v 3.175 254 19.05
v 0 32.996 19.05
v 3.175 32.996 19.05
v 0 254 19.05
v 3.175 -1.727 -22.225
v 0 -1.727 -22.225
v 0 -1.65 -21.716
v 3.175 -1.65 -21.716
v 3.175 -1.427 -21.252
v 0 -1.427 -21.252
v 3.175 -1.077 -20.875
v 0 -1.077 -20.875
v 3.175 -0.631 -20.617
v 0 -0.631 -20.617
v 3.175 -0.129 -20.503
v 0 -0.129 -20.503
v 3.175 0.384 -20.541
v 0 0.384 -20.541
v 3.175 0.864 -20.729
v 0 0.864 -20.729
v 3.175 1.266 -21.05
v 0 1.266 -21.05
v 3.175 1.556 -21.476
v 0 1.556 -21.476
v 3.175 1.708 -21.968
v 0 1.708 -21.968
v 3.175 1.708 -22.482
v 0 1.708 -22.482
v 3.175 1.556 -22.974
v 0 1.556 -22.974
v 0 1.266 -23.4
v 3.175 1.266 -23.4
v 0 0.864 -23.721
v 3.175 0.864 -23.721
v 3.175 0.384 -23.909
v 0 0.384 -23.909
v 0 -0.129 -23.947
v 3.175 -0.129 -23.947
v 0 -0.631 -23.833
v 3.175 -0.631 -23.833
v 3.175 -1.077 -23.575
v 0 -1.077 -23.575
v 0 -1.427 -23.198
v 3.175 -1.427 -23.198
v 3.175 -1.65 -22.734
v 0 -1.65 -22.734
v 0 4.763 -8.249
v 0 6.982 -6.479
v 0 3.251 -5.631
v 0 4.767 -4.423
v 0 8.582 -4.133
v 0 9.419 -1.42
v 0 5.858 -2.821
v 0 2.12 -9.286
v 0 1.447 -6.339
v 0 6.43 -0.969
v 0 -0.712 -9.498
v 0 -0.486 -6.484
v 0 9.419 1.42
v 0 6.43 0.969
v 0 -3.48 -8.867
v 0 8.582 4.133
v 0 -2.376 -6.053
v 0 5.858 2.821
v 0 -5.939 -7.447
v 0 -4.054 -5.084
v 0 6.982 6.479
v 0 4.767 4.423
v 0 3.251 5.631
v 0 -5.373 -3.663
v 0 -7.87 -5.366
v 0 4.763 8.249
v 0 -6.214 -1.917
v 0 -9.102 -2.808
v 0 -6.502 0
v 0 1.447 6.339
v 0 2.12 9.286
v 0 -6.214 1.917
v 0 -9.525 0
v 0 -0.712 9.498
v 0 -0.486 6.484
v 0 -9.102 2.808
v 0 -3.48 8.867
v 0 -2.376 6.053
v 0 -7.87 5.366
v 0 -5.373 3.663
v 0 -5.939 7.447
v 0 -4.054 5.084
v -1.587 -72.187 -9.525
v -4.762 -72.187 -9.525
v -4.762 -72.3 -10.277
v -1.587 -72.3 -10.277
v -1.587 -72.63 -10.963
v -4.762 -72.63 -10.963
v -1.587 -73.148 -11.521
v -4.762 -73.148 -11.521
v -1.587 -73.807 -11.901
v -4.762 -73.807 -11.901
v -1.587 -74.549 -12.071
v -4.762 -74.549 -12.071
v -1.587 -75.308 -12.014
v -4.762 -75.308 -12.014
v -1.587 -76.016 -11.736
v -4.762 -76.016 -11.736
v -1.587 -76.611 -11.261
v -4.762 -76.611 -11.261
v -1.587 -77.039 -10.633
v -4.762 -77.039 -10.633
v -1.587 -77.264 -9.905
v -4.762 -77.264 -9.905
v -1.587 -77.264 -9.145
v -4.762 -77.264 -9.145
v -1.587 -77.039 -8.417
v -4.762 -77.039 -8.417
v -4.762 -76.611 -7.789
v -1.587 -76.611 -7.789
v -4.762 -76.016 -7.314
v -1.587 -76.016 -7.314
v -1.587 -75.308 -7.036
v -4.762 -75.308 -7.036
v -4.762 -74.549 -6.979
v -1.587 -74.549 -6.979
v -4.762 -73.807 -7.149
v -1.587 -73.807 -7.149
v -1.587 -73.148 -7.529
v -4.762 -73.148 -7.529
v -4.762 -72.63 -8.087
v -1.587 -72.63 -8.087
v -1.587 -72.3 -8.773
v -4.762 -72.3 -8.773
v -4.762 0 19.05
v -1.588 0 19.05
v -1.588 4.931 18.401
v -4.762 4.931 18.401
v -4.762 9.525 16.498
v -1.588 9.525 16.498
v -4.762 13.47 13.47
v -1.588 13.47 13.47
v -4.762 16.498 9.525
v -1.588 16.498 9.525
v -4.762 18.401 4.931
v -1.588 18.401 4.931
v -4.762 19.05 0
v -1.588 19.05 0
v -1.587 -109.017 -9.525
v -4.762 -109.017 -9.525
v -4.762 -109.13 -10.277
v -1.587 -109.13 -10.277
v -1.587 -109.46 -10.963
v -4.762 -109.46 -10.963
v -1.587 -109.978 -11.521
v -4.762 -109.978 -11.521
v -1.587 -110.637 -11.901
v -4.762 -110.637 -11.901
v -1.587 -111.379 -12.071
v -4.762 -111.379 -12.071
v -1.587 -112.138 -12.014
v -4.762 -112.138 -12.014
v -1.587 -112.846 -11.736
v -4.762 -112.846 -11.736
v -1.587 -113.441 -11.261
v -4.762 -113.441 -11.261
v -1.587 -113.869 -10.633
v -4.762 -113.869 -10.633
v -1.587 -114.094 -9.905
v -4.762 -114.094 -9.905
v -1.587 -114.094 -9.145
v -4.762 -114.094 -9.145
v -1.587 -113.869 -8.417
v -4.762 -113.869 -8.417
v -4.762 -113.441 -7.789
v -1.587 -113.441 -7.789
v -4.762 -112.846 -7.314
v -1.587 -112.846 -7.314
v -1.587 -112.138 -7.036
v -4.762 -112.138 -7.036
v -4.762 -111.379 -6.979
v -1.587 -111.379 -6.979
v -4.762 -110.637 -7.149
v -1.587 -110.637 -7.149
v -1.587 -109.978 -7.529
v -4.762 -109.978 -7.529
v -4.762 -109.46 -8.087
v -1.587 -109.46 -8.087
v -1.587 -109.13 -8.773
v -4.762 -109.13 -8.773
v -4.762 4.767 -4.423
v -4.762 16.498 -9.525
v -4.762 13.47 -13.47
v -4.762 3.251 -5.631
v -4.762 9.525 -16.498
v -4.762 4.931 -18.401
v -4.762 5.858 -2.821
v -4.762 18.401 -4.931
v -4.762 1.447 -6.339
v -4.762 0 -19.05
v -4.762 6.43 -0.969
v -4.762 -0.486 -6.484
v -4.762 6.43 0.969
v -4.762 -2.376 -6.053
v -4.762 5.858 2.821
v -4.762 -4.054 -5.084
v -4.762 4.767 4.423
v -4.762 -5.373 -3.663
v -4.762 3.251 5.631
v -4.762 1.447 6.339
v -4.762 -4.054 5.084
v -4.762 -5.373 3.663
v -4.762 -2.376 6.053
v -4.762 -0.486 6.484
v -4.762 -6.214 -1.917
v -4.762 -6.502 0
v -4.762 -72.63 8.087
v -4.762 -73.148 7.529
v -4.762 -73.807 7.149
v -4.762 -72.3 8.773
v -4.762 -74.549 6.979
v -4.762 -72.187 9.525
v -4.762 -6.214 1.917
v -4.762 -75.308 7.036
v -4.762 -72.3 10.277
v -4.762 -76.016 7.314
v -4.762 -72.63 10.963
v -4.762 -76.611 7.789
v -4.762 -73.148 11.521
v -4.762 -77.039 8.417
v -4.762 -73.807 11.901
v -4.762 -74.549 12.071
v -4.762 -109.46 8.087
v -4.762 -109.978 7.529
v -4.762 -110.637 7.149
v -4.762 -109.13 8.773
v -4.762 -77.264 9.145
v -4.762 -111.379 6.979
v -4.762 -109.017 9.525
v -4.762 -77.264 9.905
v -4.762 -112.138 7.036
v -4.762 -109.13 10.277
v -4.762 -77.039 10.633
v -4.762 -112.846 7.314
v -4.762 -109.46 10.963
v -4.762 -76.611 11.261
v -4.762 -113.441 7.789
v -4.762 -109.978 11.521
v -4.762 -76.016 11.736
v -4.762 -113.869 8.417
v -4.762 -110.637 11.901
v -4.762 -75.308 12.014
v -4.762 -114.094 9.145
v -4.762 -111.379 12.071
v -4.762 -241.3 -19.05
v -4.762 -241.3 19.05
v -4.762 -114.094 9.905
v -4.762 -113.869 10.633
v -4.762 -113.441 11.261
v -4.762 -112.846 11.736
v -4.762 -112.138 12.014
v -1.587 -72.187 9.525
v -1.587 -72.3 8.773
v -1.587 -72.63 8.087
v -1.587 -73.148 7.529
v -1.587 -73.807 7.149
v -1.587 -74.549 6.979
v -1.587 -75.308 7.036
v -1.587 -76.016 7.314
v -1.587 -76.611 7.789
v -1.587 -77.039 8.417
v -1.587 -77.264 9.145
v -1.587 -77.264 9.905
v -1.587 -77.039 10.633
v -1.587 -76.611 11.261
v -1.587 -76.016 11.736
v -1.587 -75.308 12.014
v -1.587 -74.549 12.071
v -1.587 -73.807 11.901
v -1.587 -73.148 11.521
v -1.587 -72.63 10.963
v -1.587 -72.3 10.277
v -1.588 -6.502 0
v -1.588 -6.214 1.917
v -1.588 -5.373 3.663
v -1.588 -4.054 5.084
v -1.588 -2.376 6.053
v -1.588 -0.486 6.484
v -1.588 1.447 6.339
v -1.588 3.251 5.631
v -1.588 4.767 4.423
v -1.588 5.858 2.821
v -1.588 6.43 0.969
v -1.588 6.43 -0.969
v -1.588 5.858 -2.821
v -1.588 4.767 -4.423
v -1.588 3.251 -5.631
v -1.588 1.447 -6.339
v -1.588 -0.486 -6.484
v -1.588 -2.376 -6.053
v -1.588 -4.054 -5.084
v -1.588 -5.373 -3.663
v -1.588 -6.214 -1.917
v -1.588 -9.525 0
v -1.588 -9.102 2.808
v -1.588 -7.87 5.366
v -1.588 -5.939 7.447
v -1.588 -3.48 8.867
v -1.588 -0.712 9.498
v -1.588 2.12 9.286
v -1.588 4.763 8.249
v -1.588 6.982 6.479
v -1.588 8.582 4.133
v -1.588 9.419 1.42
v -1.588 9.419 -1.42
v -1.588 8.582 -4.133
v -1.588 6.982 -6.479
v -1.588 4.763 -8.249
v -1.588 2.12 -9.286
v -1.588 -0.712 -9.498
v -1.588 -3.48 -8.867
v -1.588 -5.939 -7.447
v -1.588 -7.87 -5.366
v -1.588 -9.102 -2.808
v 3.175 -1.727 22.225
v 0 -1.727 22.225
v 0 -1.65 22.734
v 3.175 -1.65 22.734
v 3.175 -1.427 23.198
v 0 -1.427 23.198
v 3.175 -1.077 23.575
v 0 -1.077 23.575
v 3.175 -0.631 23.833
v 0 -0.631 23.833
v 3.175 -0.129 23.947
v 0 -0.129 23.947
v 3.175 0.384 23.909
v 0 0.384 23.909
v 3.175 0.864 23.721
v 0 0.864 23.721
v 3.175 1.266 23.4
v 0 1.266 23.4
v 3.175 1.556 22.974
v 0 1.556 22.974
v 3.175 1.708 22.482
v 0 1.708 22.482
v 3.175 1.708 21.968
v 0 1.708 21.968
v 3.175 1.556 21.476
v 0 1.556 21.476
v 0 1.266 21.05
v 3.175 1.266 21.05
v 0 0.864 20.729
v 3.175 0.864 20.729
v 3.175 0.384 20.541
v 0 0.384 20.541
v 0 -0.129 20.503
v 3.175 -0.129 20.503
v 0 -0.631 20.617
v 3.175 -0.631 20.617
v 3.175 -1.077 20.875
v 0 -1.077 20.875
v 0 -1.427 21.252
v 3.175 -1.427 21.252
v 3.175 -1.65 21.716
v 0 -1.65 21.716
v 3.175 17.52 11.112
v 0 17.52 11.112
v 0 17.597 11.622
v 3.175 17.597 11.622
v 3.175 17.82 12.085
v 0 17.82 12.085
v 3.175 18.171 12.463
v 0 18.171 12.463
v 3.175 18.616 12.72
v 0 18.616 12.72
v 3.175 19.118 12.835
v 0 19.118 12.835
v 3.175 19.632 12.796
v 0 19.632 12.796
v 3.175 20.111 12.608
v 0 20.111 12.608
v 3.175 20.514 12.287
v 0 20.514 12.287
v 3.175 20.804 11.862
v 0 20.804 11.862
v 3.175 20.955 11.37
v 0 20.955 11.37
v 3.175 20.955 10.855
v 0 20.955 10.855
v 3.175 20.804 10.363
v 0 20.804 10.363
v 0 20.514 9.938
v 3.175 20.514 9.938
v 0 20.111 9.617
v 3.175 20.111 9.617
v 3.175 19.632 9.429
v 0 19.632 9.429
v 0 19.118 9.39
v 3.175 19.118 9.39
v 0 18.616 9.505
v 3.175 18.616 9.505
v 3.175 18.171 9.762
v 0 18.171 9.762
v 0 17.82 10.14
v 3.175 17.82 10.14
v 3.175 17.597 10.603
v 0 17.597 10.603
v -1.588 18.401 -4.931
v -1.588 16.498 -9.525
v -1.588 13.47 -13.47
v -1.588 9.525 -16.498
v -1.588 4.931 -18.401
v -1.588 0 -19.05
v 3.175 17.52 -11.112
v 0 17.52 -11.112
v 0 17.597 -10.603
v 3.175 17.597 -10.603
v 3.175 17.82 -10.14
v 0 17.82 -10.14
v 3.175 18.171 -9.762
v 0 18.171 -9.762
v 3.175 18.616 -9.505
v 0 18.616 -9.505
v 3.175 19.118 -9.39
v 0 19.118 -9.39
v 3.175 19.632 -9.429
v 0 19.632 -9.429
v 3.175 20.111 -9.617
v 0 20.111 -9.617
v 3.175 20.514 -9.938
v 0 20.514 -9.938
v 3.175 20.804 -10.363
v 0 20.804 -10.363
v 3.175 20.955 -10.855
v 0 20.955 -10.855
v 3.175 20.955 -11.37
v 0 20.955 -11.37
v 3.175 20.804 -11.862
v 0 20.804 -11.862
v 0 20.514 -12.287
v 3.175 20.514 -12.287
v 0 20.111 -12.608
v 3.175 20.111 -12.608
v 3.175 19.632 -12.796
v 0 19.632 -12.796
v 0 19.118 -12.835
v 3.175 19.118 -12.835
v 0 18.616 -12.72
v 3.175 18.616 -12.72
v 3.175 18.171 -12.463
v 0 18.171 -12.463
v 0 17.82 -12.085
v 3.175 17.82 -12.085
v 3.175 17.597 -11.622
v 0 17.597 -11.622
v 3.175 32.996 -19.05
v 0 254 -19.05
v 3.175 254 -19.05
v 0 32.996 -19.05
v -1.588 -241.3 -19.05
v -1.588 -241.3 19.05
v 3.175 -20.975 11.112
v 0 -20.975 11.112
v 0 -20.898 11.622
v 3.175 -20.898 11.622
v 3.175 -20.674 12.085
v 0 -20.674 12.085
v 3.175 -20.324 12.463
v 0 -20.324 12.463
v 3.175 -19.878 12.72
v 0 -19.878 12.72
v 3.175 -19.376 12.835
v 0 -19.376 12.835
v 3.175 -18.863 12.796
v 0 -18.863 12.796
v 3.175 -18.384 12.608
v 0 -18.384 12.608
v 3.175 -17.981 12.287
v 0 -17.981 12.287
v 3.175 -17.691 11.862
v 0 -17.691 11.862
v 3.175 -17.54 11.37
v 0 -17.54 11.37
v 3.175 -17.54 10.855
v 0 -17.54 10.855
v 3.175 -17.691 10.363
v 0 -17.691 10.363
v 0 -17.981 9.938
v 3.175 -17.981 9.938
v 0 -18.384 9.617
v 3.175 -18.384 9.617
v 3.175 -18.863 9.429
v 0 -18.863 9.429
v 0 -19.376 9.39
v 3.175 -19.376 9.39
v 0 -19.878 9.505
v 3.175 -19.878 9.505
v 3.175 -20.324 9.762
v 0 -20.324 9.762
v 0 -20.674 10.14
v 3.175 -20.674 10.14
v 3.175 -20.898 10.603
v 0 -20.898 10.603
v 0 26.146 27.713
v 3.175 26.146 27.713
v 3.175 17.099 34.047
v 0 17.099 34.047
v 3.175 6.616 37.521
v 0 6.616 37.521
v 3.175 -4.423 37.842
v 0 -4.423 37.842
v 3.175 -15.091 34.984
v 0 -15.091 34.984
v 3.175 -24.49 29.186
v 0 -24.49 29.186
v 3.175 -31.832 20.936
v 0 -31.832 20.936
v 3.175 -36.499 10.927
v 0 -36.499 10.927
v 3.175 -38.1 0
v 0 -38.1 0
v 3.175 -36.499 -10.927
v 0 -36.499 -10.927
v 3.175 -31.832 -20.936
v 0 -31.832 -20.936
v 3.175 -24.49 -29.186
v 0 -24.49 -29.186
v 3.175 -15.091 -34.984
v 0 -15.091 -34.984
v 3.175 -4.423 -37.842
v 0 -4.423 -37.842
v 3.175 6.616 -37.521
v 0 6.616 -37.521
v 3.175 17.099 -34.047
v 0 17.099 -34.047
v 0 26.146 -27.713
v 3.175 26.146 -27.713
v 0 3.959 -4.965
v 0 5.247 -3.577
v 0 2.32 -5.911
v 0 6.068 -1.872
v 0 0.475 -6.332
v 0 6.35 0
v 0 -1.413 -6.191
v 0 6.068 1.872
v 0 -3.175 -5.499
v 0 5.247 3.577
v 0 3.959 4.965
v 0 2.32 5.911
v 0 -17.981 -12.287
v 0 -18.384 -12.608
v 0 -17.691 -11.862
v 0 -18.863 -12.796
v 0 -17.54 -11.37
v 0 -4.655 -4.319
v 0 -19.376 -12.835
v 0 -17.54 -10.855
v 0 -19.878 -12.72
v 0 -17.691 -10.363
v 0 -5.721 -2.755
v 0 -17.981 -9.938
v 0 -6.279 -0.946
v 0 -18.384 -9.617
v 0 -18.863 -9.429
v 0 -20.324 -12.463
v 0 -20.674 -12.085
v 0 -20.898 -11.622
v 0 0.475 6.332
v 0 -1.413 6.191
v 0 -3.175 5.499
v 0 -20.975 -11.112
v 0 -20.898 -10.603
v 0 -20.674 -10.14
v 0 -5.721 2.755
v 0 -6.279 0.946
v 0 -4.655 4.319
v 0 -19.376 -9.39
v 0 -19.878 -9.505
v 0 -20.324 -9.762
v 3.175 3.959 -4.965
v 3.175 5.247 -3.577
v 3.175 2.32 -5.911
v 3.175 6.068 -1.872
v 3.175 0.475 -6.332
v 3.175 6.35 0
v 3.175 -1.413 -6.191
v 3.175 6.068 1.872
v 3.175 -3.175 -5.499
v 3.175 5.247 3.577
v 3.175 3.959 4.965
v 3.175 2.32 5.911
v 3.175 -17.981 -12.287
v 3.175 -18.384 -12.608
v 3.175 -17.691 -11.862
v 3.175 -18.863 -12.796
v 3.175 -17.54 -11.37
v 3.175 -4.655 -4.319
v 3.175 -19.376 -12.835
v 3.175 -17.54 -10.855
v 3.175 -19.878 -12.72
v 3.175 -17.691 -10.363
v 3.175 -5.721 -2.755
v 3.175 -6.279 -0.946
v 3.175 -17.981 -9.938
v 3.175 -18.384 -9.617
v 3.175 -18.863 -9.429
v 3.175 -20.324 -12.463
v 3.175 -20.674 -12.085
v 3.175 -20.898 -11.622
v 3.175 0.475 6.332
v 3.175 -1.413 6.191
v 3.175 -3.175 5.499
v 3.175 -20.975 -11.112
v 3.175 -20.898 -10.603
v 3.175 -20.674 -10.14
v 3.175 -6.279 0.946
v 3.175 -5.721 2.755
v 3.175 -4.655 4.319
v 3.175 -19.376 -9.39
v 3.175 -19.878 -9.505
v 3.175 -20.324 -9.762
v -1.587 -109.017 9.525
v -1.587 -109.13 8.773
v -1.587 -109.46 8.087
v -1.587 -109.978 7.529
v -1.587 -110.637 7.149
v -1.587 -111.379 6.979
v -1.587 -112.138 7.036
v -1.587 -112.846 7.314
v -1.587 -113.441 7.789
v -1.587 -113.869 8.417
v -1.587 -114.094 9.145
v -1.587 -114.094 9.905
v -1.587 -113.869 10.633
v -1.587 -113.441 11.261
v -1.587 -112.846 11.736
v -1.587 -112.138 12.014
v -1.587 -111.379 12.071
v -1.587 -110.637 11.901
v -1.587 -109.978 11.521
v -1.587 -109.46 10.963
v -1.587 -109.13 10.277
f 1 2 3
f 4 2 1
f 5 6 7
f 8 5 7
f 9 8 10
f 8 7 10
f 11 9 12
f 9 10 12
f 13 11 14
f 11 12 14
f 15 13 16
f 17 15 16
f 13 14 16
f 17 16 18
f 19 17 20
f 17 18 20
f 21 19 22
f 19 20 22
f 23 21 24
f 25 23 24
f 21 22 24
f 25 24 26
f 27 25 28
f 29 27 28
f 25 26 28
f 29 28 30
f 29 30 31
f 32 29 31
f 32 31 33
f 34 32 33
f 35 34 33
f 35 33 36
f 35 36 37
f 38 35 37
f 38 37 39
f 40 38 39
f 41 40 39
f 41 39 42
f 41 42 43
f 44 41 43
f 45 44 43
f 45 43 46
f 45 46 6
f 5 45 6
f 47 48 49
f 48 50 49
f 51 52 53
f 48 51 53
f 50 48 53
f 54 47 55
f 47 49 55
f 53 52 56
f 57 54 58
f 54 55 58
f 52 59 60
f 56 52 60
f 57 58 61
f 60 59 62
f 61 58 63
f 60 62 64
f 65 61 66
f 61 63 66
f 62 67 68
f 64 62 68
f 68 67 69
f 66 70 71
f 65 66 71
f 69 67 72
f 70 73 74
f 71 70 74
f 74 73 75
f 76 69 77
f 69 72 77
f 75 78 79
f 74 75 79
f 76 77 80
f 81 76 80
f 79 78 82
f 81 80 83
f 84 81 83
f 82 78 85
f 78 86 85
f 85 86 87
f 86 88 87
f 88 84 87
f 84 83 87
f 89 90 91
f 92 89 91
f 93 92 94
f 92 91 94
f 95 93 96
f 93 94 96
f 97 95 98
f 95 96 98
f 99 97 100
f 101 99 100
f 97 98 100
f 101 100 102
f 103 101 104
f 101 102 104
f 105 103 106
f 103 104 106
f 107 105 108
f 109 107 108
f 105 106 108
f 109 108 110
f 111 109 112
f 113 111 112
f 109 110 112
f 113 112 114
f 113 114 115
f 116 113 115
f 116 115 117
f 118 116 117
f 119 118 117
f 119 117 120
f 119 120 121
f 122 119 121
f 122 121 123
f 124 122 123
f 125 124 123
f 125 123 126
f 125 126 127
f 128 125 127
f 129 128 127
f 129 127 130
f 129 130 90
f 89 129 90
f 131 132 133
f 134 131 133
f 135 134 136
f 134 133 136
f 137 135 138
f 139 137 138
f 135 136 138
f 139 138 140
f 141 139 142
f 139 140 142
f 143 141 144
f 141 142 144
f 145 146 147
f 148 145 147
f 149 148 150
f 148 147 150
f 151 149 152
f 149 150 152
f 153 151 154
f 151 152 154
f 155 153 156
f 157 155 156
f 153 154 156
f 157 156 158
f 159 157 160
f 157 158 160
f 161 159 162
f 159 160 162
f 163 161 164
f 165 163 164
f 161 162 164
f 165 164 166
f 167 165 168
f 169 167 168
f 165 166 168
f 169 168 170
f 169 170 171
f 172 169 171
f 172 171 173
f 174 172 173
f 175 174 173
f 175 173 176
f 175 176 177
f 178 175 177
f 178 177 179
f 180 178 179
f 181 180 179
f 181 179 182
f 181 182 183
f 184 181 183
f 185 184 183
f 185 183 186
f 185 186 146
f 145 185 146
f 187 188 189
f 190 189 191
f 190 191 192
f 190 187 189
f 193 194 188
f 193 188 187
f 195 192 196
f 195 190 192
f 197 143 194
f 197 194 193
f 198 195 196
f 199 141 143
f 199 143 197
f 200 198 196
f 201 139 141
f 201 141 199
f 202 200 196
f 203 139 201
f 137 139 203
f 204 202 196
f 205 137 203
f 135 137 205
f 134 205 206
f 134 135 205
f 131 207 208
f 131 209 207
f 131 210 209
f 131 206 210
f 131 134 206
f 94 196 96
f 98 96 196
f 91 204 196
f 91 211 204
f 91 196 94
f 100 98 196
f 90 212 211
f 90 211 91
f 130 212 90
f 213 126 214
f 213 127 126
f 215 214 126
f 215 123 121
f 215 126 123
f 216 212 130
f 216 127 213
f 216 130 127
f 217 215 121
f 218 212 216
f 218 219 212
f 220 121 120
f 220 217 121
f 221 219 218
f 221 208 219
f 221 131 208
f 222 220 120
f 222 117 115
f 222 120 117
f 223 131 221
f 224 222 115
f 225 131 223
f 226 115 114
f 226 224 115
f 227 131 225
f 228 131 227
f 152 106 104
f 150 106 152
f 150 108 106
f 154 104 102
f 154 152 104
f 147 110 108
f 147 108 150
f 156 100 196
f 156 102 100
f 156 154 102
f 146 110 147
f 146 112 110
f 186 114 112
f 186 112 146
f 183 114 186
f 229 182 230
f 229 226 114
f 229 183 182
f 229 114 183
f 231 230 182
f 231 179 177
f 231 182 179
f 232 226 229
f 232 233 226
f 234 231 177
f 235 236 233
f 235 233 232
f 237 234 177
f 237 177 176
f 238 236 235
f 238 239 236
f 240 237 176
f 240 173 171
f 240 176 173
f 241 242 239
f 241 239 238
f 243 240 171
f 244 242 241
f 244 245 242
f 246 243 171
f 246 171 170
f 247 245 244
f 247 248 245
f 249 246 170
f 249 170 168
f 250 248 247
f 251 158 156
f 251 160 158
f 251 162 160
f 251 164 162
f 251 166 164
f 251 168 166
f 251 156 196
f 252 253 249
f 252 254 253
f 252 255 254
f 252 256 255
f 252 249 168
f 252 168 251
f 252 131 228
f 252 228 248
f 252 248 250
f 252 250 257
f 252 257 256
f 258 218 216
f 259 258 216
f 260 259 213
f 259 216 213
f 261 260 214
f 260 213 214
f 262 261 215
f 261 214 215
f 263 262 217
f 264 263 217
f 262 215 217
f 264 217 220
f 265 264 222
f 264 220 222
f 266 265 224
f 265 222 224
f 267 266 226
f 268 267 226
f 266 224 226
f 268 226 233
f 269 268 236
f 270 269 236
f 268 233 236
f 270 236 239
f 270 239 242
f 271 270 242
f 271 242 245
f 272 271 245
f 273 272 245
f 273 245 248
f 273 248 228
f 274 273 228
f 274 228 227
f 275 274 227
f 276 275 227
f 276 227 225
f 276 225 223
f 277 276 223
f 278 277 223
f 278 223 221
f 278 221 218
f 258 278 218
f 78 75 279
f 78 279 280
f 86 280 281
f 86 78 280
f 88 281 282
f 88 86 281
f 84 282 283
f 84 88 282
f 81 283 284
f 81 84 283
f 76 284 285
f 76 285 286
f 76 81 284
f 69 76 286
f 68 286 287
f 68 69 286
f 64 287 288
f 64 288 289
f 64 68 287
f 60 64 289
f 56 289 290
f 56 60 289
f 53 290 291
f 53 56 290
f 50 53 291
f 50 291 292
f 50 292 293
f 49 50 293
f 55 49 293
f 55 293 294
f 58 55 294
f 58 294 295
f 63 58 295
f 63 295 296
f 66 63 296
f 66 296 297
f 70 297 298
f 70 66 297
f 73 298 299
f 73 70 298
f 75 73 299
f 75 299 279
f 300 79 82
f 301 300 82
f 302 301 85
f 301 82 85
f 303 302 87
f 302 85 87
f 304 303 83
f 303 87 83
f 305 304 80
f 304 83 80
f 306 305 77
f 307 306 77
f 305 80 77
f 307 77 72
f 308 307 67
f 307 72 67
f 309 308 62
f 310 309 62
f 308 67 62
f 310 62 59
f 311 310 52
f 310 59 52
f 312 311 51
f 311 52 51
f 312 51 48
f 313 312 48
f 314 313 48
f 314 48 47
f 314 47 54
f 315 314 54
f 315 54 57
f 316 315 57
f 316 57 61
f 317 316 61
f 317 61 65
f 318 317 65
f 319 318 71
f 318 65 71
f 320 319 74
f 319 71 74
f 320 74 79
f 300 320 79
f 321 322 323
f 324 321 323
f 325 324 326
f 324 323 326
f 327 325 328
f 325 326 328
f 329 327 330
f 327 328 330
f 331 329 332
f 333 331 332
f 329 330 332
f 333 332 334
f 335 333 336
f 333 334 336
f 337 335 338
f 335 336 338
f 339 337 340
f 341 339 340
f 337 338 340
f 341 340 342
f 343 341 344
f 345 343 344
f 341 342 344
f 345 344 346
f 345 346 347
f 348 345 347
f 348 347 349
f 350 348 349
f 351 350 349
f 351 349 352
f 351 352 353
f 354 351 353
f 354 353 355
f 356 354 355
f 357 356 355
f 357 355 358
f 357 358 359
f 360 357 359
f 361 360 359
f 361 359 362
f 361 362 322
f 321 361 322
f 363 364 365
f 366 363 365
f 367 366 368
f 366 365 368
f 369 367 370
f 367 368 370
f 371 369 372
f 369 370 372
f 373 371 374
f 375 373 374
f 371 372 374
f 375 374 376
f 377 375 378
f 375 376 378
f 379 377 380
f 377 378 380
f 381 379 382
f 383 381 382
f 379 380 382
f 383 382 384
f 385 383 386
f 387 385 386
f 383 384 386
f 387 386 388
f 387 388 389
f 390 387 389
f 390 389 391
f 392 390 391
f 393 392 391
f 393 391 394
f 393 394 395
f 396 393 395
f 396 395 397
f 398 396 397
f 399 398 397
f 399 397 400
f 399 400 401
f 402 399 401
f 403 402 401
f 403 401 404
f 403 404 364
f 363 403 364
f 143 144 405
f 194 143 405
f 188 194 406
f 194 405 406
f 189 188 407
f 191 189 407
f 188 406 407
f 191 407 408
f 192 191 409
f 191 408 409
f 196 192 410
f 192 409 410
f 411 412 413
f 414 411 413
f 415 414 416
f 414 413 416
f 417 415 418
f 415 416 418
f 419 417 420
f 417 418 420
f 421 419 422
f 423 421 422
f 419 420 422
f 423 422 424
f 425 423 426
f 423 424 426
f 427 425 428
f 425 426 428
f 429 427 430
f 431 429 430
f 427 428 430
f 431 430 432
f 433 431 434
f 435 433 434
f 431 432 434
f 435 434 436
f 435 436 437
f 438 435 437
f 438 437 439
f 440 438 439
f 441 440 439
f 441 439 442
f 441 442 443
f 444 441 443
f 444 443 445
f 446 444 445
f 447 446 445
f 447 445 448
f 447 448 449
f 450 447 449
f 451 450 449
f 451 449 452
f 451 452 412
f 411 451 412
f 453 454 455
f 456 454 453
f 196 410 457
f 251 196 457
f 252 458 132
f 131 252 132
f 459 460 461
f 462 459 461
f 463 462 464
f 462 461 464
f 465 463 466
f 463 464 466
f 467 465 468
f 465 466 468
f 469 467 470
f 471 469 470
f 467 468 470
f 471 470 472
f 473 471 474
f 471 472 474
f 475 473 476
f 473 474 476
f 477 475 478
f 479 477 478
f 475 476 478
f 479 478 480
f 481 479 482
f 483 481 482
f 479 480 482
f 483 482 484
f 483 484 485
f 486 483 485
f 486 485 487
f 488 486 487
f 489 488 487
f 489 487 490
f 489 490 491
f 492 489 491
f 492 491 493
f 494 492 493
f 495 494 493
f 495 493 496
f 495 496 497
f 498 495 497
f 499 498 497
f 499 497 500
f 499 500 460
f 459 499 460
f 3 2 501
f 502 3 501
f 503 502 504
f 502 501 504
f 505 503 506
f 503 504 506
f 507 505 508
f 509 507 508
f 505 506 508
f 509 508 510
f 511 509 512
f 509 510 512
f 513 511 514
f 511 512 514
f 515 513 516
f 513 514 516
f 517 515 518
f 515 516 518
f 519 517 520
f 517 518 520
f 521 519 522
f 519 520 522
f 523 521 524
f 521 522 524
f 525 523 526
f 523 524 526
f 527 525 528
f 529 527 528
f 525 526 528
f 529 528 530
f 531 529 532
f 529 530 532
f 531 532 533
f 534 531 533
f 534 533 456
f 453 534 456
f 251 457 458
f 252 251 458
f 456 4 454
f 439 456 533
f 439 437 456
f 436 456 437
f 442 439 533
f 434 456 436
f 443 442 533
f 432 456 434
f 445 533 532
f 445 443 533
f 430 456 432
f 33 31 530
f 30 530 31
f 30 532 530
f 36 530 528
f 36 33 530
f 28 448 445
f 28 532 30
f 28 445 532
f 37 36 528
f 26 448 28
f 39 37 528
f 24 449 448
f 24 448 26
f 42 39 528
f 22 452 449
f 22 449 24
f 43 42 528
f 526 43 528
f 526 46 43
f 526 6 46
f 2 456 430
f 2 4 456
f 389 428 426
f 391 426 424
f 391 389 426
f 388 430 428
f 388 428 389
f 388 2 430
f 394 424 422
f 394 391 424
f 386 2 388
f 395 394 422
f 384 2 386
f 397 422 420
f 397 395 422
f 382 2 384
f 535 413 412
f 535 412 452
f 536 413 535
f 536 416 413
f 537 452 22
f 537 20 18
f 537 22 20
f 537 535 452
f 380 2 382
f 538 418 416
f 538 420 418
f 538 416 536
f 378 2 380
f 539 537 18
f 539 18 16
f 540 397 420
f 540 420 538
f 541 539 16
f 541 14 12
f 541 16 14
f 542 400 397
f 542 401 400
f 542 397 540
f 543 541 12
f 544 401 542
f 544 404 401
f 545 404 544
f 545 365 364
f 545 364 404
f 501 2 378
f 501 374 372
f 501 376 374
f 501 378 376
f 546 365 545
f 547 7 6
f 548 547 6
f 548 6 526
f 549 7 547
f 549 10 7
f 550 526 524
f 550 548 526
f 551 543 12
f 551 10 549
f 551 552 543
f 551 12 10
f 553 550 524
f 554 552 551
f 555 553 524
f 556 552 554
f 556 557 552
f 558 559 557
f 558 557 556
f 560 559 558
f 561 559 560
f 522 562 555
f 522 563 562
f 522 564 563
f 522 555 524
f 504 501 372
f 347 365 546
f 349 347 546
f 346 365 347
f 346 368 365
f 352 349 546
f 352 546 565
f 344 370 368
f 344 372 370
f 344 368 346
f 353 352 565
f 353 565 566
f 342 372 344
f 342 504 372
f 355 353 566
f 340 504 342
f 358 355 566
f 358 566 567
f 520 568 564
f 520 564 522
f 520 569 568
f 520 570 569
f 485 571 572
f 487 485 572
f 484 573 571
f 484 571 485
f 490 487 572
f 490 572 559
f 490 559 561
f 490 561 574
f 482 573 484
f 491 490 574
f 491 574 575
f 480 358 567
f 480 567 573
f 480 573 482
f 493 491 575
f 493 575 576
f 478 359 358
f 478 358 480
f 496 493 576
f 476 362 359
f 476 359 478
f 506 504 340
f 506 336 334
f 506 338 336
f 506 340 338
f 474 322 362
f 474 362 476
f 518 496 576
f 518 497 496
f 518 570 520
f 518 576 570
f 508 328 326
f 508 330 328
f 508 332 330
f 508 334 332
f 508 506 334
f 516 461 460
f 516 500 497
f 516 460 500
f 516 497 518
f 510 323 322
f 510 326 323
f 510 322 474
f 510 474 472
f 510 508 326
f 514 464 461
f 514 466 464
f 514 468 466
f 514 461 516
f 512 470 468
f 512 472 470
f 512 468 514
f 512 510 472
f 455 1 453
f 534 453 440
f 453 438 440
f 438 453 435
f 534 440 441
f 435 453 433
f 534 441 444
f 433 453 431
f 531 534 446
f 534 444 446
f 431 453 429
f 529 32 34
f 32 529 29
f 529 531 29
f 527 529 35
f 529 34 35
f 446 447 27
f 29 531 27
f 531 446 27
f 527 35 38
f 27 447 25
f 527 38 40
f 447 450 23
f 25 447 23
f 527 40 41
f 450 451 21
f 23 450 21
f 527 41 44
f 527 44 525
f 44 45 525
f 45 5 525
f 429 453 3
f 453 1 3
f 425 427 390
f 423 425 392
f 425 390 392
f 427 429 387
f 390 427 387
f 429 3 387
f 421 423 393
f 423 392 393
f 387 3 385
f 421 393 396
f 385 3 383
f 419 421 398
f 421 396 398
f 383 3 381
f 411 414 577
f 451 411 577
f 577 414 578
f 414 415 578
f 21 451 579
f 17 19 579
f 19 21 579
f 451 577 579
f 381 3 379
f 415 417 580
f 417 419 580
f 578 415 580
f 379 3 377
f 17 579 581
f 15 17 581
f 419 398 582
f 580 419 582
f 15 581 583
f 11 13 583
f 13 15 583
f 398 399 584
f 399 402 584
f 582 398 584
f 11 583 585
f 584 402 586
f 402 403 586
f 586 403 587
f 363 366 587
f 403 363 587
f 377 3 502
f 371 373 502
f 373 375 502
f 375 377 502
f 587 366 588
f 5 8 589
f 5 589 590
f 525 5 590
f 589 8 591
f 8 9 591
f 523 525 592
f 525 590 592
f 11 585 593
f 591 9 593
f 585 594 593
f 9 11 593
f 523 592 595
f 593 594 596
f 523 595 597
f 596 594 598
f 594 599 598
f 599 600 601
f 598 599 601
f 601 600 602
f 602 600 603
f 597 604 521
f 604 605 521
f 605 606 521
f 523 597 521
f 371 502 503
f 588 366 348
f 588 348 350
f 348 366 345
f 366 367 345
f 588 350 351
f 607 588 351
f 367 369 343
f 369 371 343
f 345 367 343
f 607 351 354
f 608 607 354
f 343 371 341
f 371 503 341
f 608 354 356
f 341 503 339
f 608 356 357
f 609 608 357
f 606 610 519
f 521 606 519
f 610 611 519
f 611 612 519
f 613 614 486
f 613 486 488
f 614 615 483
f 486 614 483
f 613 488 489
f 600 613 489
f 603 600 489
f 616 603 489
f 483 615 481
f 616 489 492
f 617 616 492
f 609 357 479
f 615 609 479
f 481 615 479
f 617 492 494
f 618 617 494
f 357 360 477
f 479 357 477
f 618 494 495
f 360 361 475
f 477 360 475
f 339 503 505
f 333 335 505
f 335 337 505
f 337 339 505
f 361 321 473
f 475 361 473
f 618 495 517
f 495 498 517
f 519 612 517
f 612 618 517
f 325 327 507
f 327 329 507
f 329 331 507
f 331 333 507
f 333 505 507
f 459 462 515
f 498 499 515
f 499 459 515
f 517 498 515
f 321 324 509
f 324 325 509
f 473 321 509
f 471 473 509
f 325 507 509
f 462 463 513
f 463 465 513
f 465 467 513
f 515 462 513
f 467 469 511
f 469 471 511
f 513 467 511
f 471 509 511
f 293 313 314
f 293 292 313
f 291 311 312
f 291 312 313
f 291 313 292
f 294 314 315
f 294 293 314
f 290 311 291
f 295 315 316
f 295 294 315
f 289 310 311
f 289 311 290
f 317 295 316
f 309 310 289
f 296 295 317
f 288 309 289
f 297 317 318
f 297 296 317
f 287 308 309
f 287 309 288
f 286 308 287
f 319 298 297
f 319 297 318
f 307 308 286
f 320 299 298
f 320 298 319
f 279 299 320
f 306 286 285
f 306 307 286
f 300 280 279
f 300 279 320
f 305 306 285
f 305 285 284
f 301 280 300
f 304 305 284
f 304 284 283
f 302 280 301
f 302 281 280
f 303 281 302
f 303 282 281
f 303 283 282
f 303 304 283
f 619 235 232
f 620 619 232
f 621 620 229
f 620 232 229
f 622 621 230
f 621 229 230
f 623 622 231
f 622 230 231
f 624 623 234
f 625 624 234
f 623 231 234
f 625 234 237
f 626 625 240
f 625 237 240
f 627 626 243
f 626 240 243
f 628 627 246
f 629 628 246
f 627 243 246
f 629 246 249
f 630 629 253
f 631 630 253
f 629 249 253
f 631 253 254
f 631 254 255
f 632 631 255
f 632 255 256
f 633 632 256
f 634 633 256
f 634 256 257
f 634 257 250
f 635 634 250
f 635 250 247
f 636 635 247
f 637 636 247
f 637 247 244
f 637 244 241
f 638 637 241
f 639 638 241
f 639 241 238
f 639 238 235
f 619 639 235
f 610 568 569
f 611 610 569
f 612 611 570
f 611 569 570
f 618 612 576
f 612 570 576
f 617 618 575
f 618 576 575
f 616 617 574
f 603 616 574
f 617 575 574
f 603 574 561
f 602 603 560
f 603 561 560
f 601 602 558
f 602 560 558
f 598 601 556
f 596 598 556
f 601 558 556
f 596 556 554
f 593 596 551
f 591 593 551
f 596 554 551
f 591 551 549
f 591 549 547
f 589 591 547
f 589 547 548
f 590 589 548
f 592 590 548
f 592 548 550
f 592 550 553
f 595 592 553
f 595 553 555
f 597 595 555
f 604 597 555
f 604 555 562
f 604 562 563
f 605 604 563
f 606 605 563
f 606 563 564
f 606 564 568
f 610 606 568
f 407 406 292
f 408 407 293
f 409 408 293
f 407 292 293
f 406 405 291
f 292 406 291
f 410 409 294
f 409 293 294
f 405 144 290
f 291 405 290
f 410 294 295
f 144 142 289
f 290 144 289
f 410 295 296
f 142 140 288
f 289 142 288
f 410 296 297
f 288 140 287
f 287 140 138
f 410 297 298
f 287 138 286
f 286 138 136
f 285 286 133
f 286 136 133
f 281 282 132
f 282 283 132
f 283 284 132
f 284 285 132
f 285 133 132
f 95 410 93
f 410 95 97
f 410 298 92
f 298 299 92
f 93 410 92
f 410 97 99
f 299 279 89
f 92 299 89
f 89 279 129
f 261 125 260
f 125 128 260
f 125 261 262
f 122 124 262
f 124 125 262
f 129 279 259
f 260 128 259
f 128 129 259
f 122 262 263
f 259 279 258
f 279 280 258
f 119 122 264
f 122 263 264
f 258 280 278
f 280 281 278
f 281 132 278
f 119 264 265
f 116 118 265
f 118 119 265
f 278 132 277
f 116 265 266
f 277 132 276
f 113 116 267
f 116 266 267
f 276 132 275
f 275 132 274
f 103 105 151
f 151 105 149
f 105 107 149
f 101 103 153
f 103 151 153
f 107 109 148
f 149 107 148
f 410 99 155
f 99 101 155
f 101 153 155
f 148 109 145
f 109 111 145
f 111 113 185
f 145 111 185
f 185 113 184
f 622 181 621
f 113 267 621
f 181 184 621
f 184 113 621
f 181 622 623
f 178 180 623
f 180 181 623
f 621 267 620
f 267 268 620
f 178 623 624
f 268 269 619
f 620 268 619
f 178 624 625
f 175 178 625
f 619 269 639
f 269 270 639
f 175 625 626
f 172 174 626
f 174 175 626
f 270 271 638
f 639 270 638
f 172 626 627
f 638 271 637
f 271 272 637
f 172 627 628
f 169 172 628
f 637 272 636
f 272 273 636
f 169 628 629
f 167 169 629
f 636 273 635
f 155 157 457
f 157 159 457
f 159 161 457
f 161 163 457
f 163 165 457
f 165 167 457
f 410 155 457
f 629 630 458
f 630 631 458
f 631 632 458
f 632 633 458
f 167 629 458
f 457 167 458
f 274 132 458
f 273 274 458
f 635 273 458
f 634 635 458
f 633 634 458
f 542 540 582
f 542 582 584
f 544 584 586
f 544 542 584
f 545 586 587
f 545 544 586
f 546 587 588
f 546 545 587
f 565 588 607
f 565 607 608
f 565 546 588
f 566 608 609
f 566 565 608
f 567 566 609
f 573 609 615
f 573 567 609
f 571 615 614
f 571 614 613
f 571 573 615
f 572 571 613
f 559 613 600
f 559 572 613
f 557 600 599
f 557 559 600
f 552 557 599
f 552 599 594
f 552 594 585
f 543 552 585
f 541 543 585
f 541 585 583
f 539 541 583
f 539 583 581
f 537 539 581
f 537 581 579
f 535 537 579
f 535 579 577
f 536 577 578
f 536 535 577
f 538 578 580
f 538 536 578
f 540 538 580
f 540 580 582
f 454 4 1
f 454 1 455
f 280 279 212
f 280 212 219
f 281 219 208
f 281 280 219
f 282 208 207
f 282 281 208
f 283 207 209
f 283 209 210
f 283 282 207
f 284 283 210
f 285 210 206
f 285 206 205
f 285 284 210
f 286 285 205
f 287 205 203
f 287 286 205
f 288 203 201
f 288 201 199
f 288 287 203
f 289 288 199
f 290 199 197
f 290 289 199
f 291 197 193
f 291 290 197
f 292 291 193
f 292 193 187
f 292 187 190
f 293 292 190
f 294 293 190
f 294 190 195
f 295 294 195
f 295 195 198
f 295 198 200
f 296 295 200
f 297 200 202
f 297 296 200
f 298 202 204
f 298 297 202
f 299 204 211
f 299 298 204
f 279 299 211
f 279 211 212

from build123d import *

# Parameters (mm, degrees)
F0_R      = 6.35
F1_DEPTH  = 3.175
F2_R      = 9.525
F2_R_2    = 6.5024
F3_DEPTH  = 1.5875
F5_D      = 3.4544
F6_R      = 9.525
F6_R_2    = 6.5024
F7_DEPTH  = 3.175
F8_D      = 5.1054
F10_DEPTH = 3.175


with BuildPart() as f1:
    # F0 (on Right) → F1 (new body)
    with BuildSketch(Plane.YZ):
        with BuildLine():
            Line((35.9210244843, -12.7), (35.9210244843, 12.7))
            ThreePointArc((35.9210244843, 12.7), (-38.1, 0), (35.9210244843, -12.7))
        make_face()
        Circle(F0_R, mode=Mode.SUBTRACT)
        with BuildLine():
            ThreePointArc((35.9210244843, 12.7), (37.5513051228, 6.4427853895), (38.1, 0))
            ThreePointArc((38.1, 0), (37.5513051228, -6.4427853895), (35.9210244843, -12.7))
            Line((35.9210244843, -12.7), (254, -12.7))
            Line((254, -12.7), (254, 12.7))
            Line((254, 12.7), (35.9210244843, 12.7))
        make_face()
        with BuildLine():
            ThreePointArc((35.9210244843, -12.7), (37.5513051228, -6.4427853895), (38.1, 0))
            ThreePointArc((38.1, 0), (37.5513051228, 6.4427853895), (35.9210244843, 12.7))
            Line((35.9210244843, 12.7), (35.9210244843, -12.7))
        make_face()
    extrude(amount=F1_DEPTH)

    # F5 (through all)
    with Locations(Plane.YZ.offset(3.175)):
        with Locations((0, 22.225), (-19.2474145991, -11.1125), (-19.2474145991, 11.1125), (0, -22.225), (19.2474145991, 11.1125), (19.2474145991, -11.1125)):
            Hole(F5_D / 2)

    # F9 (on face) → F10 (join)
    with BuildSketch(Plane(origin=(0, 0, 0), x_dir=(0, -1, 0), z_dir=(-1, 0, 0))):
        with BuildLine():
            Line((-254, 19.05), (-254, 12.7))
            Line((-254, 12.7), (-35.9210244843, 12.7))
            ThreePointArc((-35.9210244843, 12.7), (-34.6042598667, 15.9422457351), (-32.9955678842, 19.05))
            Line((-32.9955678842, 19.05), (-254, 19.05))
        make_face()
        with BuildLine():
            Line((-35.9210244843, -12.7), (-254, -12.7))
            Line((-254, -12.7), (-254, -19.05))
            Line((-254, -19.05), (-32.9955678842, -19.05))
            ThreePointArc((-32.9955678842, -19.05), (-34.6042598667, -15.9422457351), (-35.9210244843, -12.7))
        make_face()
    extrude(amount=-F10_DEPTH)


with BuildPart() as f3:
    # F2 (on face) → F3 (new body)
    with BuildSketch(Plane(origin=(0, 0, 0), x_dir=(0, -1, 0), z_dir=(-1, 0, 0))):
        Circle(F2_R)
        Circle(F2_R_2, mode=Mode.SUBTRACT)
    extrude(amount=F3_DEPTH)


with BuildPart() as f7:
    # F6 (on face) → F7 (new body)
    with BuildSketch(Plane(origin=(-1.5875, 0, 0), x_dir=(0, -1, 0), z_dir=(-1, 0, 0))):
        with BuildLine():
            Line((241.3, 19.05), (0, 19.05))
            ThreePointArc((0, 19.05), (-13.4703841816, 13.4703841816), (-19.05, 0))
            ThreePointArc((-19.05, 0), (-13.4703841816, -13.4703841816), (0, -19.05))
            Line((0, -19.05), (241.3, -19.05))
            Line((241.3, -19.05), (241.3, 19.05))
        make_face()
        Circle(F6_R, mode=Mode.SUBTRACT)
        Circle(F6_R)
        Circle(F6_R_2, mode=Mode.SUBTRACT)
    extrude(amount=F7_DEPTH)

    # F8 (through all)
    with Locations(Plane(origin=(-1.5875, 0, 0), x_dir=(0, -1, 0), z_dir=(1, 0, 0))):
        with Locations((111.5695, -9.525), (74.7395, -9.525), (74.7395, 9.525), (111.5695, 9.525)):
            Hole(F8_D / 2)


solid = Compound([f1.part, f3.part, f7.part])
